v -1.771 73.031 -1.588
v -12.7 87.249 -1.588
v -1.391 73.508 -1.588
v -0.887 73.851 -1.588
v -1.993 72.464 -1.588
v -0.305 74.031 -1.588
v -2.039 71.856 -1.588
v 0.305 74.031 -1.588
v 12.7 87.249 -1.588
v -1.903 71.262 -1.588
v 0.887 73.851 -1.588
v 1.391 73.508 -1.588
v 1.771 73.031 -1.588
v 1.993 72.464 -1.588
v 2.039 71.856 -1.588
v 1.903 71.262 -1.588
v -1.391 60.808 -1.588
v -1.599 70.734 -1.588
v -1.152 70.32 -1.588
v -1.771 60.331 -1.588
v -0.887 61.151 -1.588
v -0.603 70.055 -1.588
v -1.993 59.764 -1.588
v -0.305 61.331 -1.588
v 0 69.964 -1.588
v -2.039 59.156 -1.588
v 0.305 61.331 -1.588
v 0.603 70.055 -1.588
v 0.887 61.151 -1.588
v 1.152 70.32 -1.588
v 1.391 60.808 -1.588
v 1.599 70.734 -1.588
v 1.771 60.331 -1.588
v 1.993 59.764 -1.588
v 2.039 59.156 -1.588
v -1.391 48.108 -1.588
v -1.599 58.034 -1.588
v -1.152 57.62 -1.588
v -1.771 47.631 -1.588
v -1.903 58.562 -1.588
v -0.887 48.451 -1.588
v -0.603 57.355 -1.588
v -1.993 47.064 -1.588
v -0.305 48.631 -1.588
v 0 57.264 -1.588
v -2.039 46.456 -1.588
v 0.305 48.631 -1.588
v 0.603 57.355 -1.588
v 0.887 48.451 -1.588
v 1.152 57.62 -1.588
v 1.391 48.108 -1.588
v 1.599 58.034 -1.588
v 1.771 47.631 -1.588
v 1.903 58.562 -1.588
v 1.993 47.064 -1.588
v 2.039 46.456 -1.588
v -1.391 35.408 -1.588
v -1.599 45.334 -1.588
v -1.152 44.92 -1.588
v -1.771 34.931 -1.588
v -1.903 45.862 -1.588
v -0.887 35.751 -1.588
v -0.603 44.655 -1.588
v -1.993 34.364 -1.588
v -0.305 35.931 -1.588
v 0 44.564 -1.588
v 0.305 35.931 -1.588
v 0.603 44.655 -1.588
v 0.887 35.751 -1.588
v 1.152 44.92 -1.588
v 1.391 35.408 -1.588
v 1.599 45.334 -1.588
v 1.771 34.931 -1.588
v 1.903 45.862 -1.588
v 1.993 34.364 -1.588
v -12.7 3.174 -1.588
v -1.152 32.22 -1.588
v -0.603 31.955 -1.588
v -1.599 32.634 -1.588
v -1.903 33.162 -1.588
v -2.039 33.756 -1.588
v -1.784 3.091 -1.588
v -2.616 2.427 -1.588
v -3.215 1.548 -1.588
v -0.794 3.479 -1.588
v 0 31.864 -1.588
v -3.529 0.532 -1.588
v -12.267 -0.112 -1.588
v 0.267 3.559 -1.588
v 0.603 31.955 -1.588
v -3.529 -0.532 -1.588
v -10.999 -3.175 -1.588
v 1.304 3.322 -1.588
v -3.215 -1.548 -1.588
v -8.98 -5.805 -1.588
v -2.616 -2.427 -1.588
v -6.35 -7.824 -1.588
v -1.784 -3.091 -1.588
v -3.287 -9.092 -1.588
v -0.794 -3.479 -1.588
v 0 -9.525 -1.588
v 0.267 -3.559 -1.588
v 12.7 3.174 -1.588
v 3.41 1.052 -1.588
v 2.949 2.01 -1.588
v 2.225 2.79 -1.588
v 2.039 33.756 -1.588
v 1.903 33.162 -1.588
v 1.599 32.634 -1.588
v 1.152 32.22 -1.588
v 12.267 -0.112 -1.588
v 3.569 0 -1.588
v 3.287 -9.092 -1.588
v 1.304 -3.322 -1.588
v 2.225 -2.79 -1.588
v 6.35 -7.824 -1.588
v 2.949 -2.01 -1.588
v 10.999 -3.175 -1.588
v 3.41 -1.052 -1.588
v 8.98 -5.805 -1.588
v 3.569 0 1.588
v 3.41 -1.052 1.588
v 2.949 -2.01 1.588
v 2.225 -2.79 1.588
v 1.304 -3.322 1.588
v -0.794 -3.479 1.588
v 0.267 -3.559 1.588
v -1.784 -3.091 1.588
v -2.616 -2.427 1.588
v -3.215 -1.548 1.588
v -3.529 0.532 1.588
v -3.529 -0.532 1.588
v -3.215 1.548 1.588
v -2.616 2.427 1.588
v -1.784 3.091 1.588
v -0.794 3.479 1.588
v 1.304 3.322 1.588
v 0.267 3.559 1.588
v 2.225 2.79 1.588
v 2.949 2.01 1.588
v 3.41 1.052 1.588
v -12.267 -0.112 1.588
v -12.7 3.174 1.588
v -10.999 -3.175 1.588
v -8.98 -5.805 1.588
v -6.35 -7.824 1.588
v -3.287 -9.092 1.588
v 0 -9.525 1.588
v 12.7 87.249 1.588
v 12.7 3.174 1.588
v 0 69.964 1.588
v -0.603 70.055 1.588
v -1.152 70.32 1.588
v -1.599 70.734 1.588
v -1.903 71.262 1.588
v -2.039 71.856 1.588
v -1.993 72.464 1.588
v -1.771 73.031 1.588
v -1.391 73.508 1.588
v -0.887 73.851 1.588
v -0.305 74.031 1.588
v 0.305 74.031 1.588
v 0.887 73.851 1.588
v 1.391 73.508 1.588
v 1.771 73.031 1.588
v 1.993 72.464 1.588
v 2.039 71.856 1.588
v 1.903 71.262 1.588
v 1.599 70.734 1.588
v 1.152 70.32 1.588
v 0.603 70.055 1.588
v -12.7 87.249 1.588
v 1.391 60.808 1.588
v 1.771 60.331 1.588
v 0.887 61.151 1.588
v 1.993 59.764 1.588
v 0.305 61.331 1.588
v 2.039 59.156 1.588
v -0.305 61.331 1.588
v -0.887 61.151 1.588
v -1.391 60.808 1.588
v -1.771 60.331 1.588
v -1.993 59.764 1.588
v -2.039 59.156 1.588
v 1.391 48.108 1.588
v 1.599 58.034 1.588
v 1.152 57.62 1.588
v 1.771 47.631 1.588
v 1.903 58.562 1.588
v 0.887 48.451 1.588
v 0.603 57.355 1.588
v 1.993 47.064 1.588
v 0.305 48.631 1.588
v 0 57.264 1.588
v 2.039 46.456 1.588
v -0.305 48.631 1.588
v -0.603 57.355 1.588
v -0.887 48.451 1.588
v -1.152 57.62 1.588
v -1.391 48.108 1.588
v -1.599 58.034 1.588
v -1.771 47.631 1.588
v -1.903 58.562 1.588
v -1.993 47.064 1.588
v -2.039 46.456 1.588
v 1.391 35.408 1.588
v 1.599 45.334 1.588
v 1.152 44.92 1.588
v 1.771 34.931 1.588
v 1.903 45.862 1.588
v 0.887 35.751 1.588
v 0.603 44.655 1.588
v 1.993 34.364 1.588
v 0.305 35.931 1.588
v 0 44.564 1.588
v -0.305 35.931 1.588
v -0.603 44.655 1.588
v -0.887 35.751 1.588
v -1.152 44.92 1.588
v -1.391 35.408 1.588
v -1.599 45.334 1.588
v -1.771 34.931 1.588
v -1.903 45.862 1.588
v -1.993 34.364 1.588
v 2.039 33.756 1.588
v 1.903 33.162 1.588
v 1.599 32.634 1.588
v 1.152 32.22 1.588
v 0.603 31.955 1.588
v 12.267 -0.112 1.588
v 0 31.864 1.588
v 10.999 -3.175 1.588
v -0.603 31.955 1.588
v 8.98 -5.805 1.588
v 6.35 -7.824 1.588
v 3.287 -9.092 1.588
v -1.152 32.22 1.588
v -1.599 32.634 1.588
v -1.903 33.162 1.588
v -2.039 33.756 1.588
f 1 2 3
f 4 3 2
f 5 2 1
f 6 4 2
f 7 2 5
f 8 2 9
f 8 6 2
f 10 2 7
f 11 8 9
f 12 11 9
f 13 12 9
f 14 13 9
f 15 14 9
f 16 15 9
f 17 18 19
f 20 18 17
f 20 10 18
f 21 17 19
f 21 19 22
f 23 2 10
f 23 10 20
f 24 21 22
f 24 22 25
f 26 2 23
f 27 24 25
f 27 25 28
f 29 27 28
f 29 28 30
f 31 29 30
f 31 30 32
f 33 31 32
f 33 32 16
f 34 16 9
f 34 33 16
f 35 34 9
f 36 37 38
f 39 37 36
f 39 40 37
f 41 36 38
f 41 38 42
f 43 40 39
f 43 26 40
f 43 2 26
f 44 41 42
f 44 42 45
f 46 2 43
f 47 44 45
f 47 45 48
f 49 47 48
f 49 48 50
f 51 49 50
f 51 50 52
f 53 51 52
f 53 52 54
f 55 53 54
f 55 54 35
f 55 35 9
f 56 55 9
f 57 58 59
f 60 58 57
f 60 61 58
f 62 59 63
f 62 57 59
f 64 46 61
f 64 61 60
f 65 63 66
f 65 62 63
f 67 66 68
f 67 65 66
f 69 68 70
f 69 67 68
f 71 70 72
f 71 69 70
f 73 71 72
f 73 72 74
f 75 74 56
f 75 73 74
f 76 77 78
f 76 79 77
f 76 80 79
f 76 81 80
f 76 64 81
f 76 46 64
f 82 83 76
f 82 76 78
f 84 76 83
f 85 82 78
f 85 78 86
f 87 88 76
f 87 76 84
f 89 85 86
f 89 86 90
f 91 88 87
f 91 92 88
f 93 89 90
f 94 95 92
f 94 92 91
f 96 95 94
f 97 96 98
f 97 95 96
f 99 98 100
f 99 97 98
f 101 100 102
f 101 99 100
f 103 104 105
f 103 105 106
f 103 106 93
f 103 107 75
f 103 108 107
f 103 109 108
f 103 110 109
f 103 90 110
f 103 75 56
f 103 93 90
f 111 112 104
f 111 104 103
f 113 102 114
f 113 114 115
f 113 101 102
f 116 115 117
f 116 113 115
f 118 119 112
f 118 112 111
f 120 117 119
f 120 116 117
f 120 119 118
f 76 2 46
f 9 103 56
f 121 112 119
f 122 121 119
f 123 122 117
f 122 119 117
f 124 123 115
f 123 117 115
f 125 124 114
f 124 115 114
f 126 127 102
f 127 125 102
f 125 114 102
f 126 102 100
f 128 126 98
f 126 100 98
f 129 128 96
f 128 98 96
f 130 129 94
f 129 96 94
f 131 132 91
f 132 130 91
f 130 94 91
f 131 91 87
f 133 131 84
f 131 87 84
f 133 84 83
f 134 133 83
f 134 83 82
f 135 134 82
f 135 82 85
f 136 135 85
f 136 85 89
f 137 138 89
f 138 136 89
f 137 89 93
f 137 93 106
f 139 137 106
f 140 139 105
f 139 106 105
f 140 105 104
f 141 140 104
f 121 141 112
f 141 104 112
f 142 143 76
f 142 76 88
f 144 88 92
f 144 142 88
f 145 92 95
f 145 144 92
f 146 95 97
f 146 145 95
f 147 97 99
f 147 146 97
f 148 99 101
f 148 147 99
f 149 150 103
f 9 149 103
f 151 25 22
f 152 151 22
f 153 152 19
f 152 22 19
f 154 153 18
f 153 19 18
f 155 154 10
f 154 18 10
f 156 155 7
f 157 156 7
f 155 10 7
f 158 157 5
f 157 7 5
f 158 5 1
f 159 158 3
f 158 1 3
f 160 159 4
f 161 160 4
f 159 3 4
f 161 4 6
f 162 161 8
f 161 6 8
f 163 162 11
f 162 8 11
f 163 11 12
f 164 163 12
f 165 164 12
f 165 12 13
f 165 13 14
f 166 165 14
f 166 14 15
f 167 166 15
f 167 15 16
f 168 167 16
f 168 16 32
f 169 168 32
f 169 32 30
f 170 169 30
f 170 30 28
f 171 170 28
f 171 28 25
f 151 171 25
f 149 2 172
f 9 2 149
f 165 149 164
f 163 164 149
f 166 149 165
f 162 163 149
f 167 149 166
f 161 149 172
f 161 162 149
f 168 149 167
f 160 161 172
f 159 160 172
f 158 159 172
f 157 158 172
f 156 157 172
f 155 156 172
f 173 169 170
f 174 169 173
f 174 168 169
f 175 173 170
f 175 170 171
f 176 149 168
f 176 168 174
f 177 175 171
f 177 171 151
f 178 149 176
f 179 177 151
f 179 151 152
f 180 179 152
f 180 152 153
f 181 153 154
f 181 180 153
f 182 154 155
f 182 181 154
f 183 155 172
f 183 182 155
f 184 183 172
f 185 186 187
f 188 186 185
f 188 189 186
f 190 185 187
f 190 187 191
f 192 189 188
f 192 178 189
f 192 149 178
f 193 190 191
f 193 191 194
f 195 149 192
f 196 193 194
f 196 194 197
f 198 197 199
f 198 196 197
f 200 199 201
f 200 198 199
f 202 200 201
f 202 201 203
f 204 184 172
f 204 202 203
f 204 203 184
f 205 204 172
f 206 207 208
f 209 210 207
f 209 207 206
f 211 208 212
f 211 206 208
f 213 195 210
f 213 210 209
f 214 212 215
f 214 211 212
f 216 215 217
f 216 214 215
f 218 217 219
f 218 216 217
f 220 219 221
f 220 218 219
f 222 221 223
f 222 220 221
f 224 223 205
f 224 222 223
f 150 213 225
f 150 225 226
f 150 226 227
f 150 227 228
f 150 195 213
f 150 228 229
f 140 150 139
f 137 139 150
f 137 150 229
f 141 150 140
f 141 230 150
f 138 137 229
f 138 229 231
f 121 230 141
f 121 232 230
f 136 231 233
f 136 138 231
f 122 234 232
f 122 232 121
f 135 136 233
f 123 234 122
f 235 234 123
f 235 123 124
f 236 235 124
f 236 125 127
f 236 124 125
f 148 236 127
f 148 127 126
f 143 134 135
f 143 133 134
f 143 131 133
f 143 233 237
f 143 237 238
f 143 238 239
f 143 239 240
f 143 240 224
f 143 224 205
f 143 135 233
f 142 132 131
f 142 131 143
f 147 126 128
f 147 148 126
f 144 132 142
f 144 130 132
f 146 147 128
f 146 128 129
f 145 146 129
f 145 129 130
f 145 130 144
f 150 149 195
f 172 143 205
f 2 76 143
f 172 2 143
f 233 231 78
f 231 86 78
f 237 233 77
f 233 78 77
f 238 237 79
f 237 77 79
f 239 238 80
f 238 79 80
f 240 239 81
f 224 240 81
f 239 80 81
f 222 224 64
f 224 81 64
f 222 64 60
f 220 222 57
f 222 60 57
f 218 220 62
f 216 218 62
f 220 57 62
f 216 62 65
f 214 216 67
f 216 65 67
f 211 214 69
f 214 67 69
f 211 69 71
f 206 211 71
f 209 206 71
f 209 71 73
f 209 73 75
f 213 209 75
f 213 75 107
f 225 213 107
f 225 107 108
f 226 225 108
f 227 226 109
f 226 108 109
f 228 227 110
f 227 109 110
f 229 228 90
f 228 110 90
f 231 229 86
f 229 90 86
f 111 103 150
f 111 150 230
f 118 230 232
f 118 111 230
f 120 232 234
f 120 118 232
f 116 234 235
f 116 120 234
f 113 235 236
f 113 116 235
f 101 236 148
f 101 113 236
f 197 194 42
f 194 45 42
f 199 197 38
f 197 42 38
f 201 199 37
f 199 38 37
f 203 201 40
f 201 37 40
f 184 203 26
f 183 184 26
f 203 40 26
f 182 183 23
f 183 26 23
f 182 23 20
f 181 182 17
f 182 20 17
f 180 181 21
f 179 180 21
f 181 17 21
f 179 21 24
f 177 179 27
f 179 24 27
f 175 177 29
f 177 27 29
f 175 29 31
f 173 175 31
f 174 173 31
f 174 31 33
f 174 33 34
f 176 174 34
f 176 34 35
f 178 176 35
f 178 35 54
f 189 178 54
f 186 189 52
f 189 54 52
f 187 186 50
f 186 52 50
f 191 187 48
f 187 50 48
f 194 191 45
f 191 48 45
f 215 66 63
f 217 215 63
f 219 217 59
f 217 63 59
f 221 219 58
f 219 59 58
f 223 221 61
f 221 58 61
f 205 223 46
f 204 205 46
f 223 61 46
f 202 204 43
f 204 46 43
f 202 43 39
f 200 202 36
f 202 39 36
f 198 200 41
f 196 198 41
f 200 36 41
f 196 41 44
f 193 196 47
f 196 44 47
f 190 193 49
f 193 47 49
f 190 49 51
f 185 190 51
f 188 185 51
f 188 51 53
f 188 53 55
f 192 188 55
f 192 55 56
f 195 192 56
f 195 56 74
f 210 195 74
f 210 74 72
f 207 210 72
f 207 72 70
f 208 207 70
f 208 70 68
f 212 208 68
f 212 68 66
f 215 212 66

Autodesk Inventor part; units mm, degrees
ref_plane "YZ Plane" through (0, 0, 0) normal (1, 0, 0) x (0, 1, 0)
ref_plane "XZ Plane" through (0, 0, 0) normal (0, 1, 0) x (-1, 0, 0)
ref_plane "XY Plane" through (0, 0, 0) normal (0, 0, 1) x (1, 0, 0)
sketch "Sketch1" plane through (0, 0, 0) normal (0, 0, 1) x (1, 0, 0)
  circle A0 centre (0, 0) radius 3.5687
  line L0 (-12.7, 61.849) -> (12.7, 61.849)
  line L1 (12.7, 61.849) -> (12.7, -9.525)
  line L2 (12.7, -9.525) -> (-12.7, -9.525)
  line L3 (-12.7, -9.525) -> (-12.7, 61.849)
  dimension "d0" = 7.1374
  dimension "d1" = 12.7
  dimension "d2" = 25.4
  dimension "d3" = 9.525
  dimension "d4" = 71.374
extrude "Extrusion1" add sketch "Sketch1" along normal mid plane 3.175
sketch "Sketch2" plane through (0, 0, 1.5875) normal (0, 0, 1) x (1, 0, 0)
  line L0 (-12.7, -9.525) -> (12.7, -9.525) projected
  point P0 (0, 46.609)
  point P1 (0, 33.909)
  point P2 (0, 59.309)
  point P3 (0, 72.009)
  dimension "d8" = 12.7
  dimension "d20" = 12.7
  dimension "d30" = 12.7
  dimension "d31" = 43.434
hole "Hole1" at (0, 46.609, 1.5875) at (0, 33.909, 1.5875) direction (0, 0, -1) diameter 4.0894 end through all
fillet "Fillet2" radius 12.7 2 edges at (12.7, -9.525, 0) (-12.7, -9.525, 0)
sketch "Sketch3" plane through (-12.7, 61.849, 1.5875) normal (0, 1, 0) x (1, 0, 0)
  line L0 (0, 3.175) -> (0, 0) projected
  line L1 (25.4, 0) -> (0, 0) projected
  line L2 (25.4, 0) -> (25.4, 3.175) projected
  line L3 (0, 3.175) -> (25.4, 3.175) projected
  point P0 (12.7, 1.5875)
extrude "Extrusion2" add sketch "Sketch3" along normal blind 25.4
hole "Hole2" at (0, 59.309, 1.5875) at (0, 72.009, 1.5875) direction (0, 0, -1) diameter 4.0894 end through all
properties part number "C18_TK_ClimberingSupportGusset" material "Aluminum 6061"
